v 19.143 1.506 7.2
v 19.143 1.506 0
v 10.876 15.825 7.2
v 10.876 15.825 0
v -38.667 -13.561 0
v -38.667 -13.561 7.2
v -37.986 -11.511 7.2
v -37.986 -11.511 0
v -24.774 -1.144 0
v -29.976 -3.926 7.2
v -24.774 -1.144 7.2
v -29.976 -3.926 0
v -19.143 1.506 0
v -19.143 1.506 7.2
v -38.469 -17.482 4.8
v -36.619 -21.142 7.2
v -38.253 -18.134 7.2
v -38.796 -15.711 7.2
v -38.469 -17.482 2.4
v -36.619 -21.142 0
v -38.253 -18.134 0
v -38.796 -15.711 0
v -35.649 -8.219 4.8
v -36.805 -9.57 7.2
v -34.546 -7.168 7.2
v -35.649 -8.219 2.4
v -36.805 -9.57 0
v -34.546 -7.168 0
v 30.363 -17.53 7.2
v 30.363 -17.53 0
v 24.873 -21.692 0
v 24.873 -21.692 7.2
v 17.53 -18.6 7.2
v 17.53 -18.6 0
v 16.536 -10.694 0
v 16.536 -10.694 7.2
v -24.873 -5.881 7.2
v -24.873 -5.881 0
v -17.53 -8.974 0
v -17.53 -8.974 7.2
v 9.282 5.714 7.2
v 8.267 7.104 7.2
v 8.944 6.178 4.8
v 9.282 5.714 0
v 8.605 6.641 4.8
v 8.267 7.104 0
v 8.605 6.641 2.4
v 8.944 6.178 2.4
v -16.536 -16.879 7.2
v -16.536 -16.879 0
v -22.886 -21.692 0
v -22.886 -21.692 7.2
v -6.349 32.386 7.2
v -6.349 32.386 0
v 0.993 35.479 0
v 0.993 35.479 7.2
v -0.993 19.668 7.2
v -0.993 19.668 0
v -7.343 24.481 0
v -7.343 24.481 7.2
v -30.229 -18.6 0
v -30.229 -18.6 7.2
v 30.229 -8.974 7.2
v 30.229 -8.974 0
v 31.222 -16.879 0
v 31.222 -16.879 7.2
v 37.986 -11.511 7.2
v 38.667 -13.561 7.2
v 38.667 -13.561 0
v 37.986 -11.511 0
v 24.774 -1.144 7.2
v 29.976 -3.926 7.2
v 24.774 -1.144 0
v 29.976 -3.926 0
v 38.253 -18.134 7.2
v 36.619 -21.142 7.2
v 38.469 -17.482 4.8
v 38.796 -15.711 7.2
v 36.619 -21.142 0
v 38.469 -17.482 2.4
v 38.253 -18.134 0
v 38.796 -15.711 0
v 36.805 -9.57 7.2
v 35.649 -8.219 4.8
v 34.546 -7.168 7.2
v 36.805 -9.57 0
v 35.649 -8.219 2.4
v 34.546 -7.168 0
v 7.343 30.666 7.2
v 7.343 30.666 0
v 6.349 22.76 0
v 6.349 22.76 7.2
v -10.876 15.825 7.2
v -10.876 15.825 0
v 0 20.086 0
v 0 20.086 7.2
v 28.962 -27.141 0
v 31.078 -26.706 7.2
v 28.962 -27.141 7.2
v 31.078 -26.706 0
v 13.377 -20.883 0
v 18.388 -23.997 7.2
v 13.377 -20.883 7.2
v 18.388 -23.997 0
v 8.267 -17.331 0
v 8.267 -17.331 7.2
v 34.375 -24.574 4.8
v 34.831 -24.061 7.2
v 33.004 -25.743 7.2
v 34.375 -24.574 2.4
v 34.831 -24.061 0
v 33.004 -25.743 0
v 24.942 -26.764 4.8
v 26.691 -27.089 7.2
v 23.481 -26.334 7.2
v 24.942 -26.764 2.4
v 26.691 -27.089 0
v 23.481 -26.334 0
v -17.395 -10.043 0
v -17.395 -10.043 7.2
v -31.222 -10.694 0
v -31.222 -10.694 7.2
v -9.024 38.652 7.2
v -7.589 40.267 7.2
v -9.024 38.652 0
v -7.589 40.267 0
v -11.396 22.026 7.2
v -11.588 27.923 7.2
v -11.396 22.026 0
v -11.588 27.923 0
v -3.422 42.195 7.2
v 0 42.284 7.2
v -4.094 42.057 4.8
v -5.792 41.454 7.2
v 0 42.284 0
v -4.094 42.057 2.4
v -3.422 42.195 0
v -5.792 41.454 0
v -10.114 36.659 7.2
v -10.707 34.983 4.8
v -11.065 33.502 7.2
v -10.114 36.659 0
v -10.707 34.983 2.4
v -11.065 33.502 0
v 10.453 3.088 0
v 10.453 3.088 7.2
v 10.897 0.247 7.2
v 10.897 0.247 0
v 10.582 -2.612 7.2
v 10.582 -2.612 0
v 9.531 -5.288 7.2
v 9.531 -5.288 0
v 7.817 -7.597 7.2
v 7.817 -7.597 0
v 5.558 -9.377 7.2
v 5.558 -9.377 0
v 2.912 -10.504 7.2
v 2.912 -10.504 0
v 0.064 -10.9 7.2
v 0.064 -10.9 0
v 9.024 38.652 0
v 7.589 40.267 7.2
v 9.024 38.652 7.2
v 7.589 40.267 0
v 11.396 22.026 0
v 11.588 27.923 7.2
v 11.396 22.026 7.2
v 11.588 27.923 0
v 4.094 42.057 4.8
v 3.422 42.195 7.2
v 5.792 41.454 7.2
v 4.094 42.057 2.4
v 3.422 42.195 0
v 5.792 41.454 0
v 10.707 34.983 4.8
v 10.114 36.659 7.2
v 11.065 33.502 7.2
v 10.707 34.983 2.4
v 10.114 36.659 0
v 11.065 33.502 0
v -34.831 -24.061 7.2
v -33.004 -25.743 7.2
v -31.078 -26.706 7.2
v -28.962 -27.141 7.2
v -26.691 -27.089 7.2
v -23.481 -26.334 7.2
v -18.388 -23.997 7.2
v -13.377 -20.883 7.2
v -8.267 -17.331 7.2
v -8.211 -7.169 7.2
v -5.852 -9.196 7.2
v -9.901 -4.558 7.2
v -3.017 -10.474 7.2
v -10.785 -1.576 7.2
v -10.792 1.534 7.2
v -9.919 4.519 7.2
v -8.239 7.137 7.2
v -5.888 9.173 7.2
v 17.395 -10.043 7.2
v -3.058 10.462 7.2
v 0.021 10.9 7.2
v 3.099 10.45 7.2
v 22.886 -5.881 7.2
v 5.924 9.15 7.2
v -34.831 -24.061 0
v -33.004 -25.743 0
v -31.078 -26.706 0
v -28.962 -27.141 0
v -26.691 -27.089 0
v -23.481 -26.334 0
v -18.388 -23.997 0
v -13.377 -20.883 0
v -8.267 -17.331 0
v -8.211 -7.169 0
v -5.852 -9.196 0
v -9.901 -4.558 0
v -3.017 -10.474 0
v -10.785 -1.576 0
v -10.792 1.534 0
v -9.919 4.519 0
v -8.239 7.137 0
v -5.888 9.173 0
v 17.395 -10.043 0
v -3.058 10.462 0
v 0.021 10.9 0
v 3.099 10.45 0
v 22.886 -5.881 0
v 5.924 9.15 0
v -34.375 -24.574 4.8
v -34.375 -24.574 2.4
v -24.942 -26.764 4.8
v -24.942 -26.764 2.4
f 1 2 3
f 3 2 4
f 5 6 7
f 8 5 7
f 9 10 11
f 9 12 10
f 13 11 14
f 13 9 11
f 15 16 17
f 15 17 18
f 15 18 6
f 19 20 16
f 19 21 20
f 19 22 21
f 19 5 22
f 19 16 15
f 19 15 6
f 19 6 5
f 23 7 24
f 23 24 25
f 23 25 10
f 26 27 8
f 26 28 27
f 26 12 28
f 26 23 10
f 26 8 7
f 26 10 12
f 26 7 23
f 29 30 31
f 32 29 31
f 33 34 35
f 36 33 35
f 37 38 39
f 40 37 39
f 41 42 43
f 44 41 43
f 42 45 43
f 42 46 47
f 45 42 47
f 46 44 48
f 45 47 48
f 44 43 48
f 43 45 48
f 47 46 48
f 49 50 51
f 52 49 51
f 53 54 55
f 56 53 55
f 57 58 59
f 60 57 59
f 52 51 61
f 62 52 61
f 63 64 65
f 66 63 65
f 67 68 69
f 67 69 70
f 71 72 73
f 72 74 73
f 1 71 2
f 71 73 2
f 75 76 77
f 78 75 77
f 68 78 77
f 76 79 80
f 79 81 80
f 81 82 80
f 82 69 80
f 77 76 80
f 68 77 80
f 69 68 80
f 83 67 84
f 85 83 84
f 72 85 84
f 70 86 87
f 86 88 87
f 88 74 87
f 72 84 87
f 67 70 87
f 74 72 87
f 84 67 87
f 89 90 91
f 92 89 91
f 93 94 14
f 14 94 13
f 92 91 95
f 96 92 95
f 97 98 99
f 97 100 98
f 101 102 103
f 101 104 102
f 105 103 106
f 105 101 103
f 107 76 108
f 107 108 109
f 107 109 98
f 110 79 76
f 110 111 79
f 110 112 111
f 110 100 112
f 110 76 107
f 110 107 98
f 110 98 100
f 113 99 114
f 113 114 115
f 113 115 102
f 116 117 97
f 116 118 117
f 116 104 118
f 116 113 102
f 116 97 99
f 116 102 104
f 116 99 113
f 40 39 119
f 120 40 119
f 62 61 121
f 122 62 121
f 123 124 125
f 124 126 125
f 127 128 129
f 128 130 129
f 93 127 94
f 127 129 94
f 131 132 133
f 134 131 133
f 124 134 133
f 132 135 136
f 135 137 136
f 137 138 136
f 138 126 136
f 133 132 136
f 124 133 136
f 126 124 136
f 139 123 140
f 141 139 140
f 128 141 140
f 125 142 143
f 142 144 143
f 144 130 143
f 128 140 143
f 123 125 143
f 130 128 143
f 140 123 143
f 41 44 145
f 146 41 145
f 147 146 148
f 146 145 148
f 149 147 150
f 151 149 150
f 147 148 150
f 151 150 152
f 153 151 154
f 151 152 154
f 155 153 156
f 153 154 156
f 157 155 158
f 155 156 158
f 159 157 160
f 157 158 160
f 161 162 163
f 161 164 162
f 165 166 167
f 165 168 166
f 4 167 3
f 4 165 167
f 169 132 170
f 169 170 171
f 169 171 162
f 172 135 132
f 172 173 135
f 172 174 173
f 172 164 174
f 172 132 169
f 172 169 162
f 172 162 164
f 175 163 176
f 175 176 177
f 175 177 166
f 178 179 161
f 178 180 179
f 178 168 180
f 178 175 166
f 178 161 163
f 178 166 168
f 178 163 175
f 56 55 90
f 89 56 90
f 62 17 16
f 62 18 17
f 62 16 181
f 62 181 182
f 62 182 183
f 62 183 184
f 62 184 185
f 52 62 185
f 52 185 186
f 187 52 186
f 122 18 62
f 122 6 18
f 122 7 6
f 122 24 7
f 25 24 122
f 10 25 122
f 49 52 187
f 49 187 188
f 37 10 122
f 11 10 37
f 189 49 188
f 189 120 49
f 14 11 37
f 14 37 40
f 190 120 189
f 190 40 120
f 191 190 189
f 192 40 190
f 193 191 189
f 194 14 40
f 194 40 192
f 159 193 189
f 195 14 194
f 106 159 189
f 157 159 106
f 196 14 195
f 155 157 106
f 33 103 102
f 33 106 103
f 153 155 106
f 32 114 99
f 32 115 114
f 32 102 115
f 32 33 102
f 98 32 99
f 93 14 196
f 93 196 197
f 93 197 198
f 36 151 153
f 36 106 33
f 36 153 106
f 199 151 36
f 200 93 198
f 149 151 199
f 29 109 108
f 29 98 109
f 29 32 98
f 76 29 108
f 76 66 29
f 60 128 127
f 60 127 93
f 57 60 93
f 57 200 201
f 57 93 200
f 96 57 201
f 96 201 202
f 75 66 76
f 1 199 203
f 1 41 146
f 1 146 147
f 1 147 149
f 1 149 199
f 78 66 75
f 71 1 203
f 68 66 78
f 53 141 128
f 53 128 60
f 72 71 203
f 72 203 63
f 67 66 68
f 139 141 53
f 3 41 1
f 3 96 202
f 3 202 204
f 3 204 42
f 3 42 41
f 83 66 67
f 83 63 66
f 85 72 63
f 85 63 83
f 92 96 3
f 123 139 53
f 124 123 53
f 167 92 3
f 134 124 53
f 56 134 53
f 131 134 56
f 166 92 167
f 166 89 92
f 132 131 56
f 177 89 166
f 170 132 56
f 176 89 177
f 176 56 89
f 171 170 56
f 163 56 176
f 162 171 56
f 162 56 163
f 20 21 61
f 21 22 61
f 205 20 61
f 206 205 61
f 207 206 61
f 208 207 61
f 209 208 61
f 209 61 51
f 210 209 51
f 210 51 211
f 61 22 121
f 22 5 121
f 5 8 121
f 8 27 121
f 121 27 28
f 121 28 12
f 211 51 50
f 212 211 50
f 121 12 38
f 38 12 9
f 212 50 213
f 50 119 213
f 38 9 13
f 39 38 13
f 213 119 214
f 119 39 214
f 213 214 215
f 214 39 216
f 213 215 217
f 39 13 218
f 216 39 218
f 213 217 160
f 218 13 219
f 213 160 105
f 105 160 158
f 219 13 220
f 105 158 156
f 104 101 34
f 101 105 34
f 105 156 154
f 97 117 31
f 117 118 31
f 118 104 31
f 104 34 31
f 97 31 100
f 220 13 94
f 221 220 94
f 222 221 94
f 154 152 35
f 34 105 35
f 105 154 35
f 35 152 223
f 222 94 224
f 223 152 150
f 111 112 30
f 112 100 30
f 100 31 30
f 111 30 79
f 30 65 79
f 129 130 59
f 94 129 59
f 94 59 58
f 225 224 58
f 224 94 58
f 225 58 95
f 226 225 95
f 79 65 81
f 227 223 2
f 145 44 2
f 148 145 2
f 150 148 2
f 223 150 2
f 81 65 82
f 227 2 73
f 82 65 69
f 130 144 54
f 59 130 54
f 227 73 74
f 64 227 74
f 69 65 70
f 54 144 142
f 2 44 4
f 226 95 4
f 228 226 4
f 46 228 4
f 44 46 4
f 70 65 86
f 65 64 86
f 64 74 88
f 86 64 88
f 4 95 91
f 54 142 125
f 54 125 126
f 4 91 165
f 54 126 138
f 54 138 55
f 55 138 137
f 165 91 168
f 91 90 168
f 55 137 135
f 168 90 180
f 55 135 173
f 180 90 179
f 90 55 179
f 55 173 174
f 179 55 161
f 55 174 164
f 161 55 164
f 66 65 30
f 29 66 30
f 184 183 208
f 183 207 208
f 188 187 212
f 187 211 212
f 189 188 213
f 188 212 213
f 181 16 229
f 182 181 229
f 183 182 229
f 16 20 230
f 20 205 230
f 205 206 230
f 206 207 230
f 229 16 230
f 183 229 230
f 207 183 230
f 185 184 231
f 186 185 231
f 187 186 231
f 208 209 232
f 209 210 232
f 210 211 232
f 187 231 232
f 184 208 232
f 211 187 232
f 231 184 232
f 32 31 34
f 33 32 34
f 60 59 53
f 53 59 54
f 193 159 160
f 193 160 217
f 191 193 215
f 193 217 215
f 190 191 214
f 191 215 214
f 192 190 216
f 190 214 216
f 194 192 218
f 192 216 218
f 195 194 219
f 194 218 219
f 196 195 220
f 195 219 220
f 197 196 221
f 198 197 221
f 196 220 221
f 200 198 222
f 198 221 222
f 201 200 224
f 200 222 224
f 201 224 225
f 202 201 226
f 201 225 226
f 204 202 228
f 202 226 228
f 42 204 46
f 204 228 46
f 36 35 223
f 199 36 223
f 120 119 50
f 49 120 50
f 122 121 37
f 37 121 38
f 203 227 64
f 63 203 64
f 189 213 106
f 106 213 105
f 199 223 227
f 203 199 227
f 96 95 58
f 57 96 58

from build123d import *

# Parameters (mm, degrees)
F1_DEPTH = 7.2


with BuildPart() as f1:
    # F0 (on Top) → F1 (new body)
    with BuildSketch(Plane.XY):
        with BuildLine():
            Line((-8.2668317482, -17.3311792314), (0.1017643333, -17.3311792314))
            Line((0.1017643333, -17.3311792314), (8.2668317482, -17.3311792314))
            add(Edge.make_bspline(
                [(36.6192528714, -21.1421355028), (36.0259011039, -22.4667622734), (33.1013576776, -26.9667648317), (23.9156707234, -28.3936125615), (14.039303545, -21.4118387937), (8.2668317482, -17.3311792314)],
                knots=[0.4597765415, 0.4597765415, 0.4597765415, 0.4597765415, 0.5296754291, 0.7251078993, 1, 1, 1, 1], degree=3))
            add(Edge.make_bspline(
                [(36.6192528714, -21.1421355028), (37.4697374215, -19.9659644134), (39.9045822409, -15.1832342327), (36.5474251452, -6.5147721142), (25.5628481096, -1.4524741246), (19.142657366, 1.506303313)],
                knots=[0.4597765415, 0.4597765415, 0.4597765415, 0.4597765415, 0.5296754291, 0.7251078993, 1, 1, 1, 1], degree=3))
            Line((19.142657366, 1.506303313), (10.8758256178, 15.8248759184))
            add(Edge.make_bspline(
                [(0, 42.2842710057), (1.4438363177, 42.4327266869), (6.8032245633, 42.1499990644), (12.6317544218, 34.9083846758), (11.5235445645, 22.8643129183), (10.8758256178, 15.8248759184)],
                knots=[0.4597765415, 0.4597765415, 0.4597765415, 0.4597765415, 0.5296754291, 0.7251078993, 1, 1, 1, 1], degree=3))
            add(Edge.make_bspline(
                [(0, 42.2842710057), (-1.4438363177, 42.4327266869), (-6.8032245633, 42.1499990644), (-12.6317544218, 34.9083846758), (-11.5235445645, 22.8643129183), (-10.8758256178, 15.8248759184)],
                knots=[0.4597765415, 0.4597765415, 0.4597765415, 0.4597765415, 0.5296754291, 0.7251078993, 1, 1, 1, 1], degree=3))
            Line((-10.8758256178, 15.8248759184), (-19.142657366, 1.506303313))
            add(Edge.make_bspline(
                [(-36.6192528714, -21.1421355028), (-37.4697374215, -19.9659644134), (-39.9045822409, -15.1832342327), (-36.5474251452, -6.5147721142), (-25.5628481096, -1.4524741246), (-19.142657366, 1.506303313)],
                knots=[0.4597765415, 0.4597765415, 0.4597765415, 0.4597765415, 0.5296754291, 0.7251078993, 1, 1, 1, 1], degree=3))
            add(Edge.make_bspline(
                [(-36.6192528714, -21.1421355028), (-36.0259011039, -22.4667622734), (-33.1013576776, -26.9667648317), (-23.9156707234, -28.3936125615), (-14.039303545, -21.4118387937), (-8.2668317482, -17.3311792314)],
                knots=[0.4597765415, 0.4597765415, 0.4597765415, 0.4597765415, 0.5296754291, 0.7251078993, 1, 1, 1, 1], degree=3))
        make_face()
        Polygon((-31.2220487017, -10.6943638675), (-24.8726151374, -5.881392497), (-17.5297428808, -8.9736775782), (-17.3953376506, -10.0432028752), (-16.5363041885, -16.8789340297), (-22.8857377528, -21.6919054001), (-30.2286100094, -18.599620319), align=None, mode=Mode.SUBTRACT)
        with BuildLine():
            ThreePointArc((0.0640009602, -10.8998121028), (-9.9190071048, 4.5192143183), (8.2668317482, 7.1041884017))
            add(Edge.make_bspline(
                [(8.2668317482, 7.1041884017), (8.6052555966, 6.6408728417), (8.943679445, 6.1775572816), (9.2821032933, 5.7142417215)],
                knots=[0, 0, 0, 0, 1.7212577042, 1.7212577042, 1.7212577042, 1.7212577042], degree=3))
            ThreePointArc((9.2821032933, 5.7142417215), (9.5312177763, -5.2882783305), (0.0640009602, -10.8998121028))
        make_face(mode=Mode.SUBTRACT)
        Polygon((24.8726151374, -21.6919054001), (17.5297428808, -18.599620319), (16.5363041884, -10.6943638675), (17.3953376506, -10.0432028752), (22.8857377528, -5.881392497), (30.2286100094, -8.9736775782), (31.2220487017, -16.8789340297), (30.3630152395, -17.5300950219), align=None, mode=Mode.SUBTRACT)
        Polygon((-6.3494335643, 32.3862692676), (0.9934386923, 35.4785543487), (7.3428722566, 30.6655829783), (6.3494335643, 22.7603265268), (0, 20.0864057505), (-0.9934386923, 19.6680414456), (-7.3428722566, 24.481012816), align=None, mode=Mode.SUBTRACT)
    extrude(amount=F1_DEPTH)


solid = f1.part
